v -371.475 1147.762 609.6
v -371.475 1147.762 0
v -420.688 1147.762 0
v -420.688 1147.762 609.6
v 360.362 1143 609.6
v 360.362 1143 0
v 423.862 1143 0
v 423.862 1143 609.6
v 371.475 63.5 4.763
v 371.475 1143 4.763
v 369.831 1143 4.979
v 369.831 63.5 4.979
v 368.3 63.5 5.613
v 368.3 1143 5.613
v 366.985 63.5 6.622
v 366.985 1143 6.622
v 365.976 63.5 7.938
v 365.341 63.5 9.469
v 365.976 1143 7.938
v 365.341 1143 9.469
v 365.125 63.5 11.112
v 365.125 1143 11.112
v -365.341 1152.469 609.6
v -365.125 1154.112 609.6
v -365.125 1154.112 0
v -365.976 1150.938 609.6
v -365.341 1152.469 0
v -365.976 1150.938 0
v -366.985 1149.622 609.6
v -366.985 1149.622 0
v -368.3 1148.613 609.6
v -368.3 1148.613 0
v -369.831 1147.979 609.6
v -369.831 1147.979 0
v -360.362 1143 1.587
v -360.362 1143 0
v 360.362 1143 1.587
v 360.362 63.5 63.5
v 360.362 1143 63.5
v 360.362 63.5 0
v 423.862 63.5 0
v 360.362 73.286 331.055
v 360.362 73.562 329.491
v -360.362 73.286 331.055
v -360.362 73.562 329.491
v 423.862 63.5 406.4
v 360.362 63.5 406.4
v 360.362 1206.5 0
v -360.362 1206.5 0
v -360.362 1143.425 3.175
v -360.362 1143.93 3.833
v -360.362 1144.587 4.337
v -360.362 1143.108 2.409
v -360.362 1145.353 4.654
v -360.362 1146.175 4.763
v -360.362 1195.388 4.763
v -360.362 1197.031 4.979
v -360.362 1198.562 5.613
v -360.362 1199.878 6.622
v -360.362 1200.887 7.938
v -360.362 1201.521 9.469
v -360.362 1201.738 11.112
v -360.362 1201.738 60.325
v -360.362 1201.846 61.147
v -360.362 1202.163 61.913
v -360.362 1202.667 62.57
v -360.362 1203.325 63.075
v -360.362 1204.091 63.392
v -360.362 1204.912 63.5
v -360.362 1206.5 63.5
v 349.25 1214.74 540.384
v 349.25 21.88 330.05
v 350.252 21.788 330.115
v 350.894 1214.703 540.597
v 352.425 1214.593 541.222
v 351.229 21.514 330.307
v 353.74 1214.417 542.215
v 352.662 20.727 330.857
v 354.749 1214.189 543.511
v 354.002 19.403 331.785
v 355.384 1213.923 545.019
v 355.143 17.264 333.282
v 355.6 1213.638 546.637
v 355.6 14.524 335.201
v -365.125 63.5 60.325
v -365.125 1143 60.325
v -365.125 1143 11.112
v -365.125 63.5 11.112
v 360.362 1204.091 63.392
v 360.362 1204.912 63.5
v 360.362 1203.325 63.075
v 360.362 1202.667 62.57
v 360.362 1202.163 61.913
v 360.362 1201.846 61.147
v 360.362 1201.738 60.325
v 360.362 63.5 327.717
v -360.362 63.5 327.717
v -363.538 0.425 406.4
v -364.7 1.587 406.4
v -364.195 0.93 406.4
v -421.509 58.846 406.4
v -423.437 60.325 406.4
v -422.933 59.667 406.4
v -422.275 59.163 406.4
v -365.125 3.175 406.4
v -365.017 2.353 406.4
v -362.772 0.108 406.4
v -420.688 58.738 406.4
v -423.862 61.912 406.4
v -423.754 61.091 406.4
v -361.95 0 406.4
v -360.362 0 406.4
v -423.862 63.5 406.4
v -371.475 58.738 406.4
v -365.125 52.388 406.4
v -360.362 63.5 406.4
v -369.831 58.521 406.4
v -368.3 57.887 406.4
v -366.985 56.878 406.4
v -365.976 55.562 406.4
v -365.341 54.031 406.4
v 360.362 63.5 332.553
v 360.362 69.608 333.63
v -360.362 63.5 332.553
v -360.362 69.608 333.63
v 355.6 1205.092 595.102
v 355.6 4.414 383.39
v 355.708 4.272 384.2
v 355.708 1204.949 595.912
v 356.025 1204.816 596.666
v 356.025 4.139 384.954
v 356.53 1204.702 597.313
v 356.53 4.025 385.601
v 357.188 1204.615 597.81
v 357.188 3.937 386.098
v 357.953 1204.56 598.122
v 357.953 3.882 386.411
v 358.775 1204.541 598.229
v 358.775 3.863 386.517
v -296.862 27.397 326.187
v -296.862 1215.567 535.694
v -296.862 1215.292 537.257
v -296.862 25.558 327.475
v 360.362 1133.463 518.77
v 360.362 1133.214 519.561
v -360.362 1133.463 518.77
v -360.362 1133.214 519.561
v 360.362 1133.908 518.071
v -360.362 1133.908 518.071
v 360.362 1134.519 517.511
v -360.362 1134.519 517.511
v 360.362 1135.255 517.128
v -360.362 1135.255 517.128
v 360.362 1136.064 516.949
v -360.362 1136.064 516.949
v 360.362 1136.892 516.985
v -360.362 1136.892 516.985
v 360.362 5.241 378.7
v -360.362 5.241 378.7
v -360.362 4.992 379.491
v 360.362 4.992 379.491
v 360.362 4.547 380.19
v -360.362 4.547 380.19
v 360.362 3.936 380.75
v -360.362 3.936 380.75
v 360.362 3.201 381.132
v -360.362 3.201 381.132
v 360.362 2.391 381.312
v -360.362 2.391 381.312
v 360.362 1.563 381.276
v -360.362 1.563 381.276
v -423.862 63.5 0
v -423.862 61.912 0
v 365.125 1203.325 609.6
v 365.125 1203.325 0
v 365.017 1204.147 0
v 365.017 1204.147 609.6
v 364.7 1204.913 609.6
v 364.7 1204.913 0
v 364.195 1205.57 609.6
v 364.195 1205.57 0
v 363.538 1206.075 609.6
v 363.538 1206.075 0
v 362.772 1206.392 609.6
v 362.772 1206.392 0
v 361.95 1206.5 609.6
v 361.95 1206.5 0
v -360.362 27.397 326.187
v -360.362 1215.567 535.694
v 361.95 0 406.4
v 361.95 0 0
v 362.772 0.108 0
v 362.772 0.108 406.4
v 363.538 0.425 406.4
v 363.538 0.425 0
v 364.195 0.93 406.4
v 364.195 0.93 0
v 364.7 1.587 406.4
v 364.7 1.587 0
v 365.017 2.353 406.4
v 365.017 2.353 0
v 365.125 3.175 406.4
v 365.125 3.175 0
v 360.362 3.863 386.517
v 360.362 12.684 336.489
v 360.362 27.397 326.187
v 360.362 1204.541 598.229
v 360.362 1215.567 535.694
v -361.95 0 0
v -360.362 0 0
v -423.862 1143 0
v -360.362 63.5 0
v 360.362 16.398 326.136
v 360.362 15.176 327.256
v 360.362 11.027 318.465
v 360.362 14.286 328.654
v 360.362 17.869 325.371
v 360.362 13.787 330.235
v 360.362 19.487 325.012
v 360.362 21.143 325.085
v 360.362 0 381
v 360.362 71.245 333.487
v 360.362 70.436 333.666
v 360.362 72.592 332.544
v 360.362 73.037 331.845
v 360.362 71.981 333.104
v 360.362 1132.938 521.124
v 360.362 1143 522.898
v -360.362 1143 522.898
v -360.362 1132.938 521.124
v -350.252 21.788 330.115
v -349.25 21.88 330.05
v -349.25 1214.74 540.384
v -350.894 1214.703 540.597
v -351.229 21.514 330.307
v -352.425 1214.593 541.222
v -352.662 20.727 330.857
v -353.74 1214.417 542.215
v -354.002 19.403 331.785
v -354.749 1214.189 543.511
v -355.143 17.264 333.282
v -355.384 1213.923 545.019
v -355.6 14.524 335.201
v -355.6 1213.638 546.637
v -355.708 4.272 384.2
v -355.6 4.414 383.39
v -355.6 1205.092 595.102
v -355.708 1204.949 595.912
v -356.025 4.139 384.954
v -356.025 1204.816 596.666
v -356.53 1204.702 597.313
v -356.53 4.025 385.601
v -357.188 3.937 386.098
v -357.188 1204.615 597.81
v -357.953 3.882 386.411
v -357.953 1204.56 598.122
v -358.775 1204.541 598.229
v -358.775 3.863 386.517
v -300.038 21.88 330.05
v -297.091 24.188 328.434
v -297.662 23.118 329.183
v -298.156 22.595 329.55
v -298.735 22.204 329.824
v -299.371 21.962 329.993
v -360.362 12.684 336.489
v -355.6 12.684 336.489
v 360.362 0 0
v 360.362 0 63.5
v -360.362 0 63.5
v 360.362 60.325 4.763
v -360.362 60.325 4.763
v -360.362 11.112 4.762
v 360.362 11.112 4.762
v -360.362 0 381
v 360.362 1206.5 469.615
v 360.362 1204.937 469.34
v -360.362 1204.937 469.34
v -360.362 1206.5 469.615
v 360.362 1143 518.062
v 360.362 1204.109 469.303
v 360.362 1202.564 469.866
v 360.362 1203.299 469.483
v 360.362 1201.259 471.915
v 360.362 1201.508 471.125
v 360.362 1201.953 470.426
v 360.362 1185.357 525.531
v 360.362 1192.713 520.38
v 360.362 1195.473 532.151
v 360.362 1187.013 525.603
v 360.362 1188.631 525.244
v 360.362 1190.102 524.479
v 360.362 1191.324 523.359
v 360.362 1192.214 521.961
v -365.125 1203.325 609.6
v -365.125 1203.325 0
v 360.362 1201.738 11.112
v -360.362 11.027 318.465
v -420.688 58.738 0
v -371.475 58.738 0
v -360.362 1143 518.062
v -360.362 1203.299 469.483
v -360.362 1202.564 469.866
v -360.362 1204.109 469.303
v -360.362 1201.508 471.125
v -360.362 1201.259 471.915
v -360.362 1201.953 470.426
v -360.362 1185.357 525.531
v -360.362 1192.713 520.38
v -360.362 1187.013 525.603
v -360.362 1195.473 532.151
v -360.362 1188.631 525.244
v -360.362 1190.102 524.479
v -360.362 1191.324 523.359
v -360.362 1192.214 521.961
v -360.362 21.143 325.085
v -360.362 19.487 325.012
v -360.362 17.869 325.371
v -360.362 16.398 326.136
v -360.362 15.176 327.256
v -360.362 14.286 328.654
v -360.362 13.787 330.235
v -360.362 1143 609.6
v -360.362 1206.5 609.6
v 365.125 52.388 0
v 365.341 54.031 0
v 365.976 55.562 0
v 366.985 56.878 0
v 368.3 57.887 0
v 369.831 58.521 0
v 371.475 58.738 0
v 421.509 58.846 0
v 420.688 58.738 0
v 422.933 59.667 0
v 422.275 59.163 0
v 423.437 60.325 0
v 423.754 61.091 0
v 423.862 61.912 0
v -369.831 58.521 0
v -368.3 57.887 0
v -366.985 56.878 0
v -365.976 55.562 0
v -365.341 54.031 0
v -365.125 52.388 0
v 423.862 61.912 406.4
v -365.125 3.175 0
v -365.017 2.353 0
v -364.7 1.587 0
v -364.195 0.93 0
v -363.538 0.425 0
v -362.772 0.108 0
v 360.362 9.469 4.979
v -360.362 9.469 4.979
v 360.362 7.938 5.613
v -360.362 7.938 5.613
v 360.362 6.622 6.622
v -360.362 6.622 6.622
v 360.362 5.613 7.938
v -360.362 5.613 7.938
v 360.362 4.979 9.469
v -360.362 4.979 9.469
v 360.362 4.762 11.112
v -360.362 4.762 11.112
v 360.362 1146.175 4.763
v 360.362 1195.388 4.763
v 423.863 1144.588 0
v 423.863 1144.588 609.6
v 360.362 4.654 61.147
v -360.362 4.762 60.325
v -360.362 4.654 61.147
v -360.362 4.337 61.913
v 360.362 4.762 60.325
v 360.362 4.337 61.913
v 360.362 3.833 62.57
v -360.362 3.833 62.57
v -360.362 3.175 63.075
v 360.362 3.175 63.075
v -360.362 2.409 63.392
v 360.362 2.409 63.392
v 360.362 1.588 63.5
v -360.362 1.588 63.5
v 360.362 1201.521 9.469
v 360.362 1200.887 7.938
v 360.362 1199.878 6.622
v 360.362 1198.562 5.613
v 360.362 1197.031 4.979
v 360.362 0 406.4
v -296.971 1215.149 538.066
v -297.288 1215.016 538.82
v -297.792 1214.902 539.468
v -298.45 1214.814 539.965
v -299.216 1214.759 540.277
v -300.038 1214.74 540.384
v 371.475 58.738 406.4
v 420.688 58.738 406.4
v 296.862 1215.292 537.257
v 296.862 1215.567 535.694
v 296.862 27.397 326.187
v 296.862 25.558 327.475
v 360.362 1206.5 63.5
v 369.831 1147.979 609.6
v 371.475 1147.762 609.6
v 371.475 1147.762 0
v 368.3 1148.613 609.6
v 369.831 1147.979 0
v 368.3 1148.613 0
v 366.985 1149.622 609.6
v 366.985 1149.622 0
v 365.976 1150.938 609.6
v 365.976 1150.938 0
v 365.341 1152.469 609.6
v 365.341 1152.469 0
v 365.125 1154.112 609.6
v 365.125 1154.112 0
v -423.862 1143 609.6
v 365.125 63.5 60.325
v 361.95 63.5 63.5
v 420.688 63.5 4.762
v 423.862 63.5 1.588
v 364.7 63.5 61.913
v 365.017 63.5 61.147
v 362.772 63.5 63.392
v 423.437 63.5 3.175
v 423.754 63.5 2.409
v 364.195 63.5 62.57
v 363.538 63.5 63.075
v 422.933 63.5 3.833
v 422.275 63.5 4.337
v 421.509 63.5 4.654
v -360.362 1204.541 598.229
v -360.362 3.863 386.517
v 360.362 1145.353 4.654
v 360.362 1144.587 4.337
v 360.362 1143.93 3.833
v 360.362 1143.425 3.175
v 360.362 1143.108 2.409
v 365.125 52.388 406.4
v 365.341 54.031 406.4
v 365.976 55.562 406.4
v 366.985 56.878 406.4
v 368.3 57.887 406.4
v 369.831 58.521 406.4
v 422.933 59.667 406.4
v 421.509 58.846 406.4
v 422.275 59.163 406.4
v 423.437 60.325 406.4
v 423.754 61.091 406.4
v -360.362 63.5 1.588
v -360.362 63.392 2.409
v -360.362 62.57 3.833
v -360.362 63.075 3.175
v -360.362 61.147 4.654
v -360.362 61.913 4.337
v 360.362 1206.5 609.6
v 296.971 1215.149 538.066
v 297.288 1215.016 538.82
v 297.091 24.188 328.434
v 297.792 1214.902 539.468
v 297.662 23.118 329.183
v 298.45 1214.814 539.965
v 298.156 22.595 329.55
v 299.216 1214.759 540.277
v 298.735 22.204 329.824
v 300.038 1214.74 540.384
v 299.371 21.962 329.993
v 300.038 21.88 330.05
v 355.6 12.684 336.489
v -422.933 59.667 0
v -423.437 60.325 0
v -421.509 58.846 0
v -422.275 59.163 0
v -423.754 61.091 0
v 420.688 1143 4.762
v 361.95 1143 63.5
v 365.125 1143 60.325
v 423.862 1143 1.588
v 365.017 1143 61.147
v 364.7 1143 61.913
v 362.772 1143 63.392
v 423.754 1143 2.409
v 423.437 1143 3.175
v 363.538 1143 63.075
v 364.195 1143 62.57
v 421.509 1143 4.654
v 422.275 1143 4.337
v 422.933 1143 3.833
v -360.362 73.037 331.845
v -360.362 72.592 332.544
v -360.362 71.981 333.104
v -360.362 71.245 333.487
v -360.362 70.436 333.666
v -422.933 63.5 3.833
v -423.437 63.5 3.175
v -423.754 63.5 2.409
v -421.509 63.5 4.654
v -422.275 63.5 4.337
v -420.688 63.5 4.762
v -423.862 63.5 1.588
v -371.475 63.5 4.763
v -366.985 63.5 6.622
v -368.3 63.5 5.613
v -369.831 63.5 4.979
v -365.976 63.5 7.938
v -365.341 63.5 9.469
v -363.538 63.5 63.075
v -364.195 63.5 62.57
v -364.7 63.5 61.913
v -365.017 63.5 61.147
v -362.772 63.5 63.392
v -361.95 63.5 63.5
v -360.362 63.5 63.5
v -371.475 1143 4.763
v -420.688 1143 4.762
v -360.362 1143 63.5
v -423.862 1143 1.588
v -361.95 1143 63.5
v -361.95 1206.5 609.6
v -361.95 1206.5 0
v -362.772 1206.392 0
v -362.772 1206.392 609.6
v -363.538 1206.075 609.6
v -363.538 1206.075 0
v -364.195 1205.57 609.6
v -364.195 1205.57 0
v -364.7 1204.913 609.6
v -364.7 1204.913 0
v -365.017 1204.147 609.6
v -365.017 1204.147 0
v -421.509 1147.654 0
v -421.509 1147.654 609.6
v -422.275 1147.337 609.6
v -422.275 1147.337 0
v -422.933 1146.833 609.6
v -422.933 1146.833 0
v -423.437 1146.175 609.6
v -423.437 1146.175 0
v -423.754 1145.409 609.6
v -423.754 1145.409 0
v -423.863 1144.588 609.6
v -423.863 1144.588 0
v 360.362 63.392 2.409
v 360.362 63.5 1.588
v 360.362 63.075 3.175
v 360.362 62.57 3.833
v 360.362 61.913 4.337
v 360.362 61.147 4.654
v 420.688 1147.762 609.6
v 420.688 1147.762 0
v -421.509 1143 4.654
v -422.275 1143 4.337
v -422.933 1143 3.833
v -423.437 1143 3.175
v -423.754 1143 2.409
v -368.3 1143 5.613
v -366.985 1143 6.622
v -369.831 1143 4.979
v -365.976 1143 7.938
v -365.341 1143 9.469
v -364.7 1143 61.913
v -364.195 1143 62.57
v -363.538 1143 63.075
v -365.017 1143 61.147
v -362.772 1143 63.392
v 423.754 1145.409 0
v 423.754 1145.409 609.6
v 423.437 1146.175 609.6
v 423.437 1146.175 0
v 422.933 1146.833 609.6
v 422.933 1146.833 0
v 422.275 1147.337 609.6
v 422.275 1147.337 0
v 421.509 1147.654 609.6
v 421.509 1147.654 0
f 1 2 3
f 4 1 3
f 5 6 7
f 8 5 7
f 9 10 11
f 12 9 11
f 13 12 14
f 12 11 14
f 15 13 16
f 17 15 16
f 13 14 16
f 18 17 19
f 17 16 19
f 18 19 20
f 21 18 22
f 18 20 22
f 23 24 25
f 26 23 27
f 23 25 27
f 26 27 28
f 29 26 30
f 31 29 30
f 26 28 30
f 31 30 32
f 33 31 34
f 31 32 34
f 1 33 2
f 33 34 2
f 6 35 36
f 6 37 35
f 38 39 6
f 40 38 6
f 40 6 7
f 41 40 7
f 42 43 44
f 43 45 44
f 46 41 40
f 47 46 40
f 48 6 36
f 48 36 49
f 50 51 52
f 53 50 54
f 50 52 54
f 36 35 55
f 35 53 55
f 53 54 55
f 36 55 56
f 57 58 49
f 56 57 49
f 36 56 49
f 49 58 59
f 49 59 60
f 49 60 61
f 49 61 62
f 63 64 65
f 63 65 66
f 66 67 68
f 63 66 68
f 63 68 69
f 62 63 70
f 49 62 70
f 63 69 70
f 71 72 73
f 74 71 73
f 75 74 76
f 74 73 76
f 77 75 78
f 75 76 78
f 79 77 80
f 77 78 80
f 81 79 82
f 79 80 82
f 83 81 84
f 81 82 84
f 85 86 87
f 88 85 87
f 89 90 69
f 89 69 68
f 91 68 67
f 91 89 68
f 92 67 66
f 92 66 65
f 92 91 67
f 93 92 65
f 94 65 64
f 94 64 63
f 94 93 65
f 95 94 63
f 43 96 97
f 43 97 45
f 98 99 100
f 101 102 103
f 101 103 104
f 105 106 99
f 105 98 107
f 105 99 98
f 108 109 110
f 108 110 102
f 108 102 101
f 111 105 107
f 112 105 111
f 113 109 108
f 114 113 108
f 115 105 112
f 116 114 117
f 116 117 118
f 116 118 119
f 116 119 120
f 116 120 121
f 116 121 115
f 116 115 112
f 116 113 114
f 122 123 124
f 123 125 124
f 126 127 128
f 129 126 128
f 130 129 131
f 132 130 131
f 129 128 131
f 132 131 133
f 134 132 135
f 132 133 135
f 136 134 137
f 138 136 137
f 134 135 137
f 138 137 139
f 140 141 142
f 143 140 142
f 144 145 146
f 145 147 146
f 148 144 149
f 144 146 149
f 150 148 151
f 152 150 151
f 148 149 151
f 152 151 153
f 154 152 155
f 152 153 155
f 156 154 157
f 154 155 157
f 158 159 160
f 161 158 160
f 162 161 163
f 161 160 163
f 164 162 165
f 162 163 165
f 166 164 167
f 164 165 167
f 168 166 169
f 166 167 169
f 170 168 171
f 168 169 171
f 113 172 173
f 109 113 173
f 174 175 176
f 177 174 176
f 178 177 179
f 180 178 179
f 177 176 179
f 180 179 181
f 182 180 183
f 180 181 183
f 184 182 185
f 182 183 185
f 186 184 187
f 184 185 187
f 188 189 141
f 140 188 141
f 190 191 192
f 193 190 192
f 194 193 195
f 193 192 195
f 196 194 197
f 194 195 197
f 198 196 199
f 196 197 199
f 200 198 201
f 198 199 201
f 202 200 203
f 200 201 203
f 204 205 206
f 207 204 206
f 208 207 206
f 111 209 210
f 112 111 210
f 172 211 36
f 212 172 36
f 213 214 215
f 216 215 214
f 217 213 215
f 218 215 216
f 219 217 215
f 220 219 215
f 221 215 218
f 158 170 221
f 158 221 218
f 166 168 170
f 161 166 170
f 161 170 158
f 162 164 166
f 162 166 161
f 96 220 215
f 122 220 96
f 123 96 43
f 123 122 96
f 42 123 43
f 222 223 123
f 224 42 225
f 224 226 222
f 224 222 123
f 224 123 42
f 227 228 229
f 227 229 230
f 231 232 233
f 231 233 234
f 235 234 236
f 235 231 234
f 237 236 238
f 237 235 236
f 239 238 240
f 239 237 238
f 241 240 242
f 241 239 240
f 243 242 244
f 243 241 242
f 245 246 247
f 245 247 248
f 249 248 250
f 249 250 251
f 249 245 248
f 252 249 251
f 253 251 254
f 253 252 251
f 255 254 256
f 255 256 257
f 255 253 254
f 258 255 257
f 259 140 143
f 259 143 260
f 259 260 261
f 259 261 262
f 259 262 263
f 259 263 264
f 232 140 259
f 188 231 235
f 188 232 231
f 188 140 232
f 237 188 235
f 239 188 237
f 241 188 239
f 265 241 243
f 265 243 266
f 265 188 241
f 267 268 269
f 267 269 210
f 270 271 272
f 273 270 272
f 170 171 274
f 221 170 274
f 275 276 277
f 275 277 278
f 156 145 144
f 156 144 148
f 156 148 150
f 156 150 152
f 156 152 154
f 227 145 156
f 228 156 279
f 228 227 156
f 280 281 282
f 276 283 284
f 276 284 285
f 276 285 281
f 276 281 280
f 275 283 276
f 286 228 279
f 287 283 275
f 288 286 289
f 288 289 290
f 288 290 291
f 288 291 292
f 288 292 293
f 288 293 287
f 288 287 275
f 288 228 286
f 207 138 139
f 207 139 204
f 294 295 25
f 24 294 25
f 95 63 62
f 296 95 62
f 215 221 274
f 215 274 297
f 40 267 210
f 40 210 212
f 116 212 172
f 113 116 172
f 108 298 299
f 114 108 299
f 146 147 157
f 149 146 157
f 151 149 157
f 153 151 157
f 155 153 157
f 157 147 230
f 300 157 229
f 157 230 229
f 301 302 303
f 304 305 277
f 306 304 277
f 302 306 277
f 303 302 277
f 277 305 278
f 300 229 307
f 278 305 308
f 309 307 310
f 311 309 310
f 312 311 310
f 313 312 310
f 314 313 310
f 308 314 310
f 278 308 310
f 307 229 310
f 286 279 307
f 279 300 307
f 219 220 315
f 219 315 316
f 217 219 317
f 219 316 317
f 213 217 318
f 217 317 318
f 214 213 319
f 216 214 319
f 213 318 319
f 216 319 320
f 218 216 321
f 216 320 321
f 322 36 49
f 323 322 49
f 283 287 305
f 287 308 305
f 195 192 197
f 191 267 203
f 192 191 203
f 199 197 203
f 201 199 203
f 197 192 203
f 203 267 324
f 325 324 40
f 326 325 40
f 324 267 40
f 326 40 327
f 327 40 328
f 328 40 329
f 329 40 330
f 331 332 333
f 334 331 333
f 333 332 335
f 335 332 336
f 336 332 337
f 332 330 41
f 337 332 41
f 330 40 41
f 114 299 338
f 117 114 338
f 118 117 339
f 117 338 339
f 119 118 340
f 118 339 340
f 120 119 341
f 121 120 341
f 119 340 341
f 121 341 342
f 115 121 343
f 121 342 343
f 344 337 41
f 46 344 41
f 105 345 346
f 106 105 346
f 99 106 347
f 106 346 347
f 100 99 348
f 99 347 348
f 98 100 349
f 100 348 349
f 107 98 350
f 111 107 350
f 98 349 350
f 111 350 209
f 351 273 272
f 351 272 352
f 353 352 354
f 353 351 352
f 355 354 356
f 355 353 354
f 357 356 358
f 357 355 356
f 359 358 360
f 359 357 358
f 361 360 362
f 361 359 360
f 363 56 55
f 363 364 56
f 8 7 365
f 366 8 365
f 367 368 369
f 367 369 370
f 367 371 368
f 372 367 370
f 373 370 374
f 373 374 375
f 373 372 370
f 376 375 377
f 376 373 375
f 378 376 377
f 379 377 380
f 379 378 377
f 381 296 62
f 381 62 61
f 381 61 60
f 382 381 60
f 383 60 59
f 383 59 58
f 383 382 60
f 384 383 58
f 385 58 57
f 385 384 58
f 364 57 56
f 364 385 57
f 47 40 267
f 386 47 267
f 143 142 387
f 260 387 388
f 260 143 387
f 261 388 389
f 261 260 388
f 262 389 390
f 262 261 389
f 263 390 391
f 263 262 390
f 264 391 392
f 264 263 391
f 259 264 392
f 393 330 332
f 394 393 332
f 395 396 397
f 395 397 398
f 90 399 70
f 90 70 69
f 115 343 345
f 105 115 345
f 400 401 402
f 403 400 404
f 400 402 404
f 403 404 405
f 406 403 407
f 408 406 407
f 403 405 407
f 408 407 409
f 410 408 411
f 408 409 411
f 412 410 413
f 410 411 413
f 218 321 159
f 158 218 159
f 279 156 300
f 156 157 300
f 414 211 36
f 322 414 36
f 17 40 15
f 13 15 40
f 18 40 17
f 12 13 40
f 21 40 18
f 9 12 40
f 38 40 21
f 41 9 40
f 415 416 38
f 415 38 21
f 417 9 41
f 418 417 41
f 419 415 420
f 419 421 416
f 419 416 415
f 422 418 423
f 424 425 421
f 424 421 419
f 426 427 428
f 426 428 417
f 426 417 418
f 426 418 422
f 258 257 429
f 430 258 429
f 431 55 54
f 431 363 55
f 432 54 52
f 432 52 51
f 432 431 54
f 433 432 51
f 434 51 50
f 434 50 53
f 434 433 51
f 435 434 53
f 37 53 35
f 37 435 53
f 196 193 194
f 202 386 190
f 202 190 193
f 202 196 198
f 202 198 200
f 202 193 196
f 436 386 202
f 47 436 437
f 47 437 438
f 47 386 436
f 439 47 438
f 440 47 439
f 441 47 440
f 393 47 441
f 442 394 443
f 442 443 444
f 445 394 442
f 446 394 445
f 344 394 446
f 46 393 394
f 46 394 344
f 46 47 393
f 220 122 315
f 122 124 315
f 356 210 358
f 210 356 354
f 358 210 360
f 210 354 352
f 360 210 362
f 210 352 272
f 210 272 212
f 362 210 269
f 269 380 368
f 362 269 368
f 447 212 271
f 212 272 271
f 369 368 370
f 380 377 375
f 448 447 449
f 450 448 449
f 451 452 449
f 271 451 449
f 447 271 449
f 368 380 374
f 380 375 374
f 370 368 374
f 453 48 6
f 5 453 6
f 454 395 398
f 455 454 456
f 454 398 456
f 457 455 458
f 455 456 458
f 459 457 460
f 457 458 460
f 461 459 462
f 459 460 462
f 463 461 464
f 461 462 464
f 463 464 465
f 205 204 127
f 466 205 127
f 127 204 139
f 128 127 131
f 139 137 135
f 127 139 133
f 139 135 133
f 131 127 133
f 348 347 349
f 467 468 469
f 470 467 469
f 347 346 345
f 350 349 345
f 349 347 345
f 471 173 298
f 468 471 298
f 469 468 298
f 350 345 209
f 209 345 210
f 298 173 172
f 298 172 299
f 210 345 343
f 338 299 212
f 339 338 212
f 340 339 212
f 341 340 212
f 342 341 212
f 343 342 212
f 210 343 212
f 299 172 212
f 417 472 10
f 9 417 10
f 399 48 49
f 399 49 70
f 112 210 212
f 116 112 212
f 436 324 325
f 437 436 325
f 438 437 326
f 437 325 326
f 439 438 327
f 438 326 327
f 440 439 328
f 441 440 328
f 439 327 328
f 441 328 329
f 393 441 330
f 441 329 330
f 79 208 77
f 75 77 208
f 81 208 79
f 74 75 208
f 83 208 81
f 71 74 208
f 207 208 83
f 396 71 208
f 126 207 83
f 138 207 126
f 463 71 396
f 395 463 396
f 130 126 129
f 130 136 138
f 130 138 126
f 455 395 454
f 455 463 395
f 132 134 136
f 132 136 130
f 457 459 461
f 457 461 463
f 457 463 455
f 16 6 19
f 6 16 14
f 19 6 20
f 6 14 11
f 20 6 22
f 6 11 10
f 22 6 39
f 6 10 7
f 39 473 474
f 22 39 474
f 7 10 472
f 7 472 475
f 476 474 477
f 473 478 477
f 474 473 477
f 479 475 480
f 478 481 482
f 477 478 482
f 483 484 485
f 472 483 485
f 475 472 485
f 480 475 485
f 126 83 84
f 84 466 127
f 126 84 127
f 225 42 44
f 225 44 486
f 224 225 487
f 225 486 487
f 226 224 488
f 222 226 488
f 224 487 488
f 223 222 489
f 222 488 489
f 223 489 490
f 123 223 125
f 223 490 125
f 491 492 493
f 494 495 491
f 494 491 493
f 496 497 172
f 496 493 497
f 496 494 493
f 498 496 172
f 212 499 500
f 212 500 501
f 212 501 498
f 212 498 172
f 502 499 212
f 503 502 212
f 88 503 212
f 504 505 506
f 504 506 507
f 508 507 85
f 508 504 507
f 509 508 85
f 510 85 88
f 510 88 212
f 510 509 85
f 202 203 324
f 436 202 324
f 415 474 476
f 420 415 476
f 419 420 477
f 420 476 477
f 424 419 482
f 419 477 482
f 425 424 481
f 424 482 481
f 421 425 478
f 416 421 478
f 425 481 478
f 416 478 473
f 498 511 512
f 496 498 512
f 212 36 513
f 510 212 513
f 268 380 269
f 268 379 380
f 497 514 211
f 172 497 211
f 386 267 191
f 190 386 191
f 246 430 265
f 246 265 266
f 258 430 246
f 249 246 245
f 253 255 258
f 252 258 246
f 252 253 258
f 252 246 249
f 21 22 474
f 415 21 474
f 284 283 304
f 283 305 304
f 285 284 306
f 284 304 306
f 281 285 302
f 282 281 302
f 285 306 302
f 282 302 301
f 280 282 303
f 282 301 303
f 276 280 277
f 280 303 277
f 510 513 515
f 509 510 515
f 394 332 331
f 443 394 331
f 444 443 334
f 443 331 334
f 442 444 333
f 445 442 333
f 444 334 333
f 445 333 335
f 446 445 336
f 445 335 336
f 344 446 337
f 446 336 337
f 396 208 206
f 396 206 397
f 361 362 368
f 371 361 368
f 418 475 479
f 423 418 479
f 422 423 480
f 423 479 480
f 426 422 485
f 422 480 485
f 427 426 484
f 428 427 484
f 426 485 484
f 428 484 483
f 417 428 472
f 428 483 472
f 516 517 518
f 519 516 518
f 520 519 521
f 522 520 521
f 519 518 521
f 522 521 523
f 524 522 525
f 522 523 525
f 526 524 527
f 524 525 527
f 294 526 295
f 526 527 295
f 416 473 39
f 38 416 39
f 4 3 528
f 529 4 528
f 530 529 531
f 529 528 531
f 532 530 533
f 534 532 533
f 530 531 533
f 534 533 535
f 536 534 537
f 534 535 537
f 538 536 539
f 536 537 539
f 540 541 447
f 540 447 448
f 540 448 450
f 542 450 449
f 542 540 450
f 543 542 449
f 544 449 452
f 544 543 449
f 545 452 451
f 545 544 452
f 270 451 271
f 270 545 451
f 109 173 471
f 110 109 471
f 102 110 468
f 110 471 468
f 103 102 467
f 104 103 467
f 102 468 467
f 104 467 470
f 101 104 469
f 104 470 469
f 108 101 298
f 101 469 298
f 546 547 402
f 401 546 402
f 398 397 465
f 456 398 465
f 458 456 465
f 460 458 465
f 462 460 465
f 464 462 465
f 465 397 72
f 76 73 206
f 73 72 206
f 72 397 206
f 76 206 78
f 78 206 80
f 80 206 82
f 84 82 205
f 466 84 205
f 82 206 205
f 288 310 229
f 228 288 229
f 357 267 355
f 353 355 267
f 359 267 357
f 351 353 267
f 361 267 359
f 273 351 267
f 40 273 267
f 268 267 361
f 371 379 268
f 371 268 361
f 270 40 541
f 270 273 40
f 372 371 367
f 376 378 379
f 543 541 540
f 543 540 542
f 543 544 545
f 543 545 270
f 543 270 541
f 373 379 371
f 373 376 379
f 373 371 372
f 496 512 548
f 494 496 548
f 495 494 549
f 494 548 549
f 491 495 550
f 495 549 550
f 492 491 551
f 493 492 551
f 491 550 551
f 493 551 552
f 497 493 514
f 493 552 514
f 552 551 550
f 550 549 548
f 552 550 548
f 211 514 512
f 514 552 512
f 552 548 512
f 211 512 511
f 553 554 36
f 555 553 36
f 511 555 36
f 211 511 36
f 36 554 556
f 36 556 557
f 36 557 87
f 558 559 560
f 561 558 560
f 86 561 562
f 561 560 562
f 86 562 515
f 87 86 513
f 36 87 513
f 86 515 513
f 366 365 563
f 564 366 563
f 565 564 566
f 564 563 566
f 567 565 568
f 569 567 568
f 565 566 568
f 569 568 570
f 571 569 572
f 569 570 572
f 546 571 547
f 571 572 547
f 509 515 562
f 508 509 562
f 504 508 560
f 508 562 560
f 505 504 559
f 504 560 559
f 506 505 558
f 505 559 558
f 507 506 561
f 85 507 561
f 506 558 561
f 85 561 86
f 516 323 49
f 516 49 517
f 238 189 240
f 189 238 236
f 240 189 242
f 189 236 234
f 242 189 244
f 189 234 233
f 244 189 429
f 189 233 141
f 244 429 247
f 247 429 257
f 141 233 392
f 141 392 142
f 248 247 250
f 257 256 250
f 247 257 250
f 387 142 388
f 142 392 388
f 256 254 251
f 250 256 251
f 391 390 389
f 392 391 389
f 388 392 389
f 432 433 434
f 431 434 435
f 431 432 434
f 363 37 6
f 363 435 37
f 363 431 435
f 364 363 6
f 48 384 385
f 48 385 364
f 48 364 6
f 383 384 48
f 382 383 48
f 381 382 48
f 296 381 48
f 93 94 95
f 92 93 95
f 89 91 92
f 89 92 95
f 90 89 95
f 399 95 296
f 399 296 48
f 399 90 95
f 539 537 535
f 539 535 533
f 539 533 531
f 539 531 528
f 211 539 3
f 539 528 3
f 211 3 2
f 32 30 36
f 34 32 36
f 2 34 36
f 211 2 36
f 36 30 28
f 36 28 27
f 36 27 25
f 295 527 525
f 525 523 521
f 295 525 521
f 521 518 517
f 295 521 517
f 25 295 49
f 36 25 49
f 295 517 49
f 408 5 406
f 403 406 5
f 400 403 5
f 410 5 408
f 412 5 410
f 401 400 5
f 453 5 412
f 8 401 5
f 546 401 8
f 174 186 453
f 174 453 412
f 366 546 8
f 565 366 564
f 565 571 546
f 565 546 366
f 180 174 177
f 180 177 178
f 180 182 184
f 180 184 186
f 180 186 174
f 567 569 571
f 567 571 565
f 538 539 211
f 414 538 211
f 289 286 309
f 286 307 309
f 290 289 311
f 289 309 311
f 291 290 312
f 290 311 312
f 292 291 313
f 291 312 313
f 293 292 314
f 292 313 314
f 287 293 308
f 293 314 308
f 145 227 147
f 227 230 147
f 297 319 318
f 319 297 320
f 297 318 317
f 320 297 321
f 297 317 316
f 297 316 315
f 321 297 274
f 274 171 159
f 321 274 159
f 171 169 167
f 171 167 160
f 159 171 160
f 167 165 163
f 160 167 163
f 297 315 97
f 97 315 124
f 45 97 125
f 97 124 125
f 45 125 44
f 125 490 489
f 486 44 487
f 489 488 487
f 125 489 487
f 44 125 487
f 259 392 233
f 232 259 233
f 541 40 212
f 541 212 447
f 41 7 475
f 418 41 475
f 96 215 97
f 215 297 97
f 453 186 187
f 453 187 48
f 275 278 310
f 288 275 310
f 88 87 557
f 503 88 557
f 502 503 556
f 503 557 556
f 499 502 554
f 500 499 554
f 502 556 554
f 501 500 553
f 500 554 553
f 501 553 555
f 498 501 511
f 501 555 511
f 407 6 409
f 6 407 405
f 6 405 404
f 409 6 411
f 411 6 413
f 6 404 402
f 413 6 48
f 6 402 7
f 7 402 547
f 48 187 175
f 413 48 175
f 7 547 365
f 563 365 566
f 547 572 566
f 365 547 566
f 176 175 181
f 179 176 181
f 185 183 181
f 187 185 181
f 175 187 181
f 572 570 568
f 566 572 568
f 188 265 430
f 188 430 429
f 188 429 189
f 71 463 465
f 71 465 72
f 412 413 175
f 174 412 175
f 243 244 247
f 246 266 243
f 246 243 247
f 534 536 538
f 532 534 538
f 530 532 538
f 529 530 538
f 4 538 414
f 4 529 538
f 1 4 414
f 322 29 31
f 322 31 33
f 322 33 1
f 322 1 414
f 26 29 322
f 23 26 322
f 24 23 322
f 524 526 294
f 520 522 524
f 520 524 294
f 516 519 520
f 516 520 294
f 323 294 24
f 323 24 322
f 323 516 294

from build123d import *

# Parameters (mm, degrees)
F2_DEPTH       = 406.4
F3_DEPTH       = 609.6
F4_DEPTH       = 360.3625
F4_DEPTH_BACK  = 360.3625
F6_DEPTH       = 1219.2
F8_DEPTH       = 784.226
F11_DEPTH      = 360.3625
F11_DEPTH_BACK = 360.3625
F13_DEPTH      = 1079.5


with BuildPart() as f2:
    # F1 (on Top) → F2 (new body)
    with BuildSketch(Plane.XY):
        with BuildLine():
            ThreePointArc((-365.125, 3.175), (-364.1950640303, 0.9299359697), (-361.95, 0))
            Line((-361.95, 0), (-360.3625, 0))
            Line((-360.3625, 0), (-360.3625, 63.5))
            Line((-360.3625, 63.5), (-423.8625, 63.5))
            Line((-423.8625, 63.5), (-423.8625, 61.9125))
            ThreePointArc((-423.8625, 61.9125), (-422.9325640303, 59.6674359697), (-420.6875, 58.7375))
            Line((-420.6875, 58.7375), (-371.475, 58.7375))
            ThreePointArc((-371.475, 58.7375), (-366.9848719395, 56.8776280605), (-365.125, 52.3875))
            Line((-365.125, 52.3875), (-365.125, 3.175))
        make_face()
    extrude(amount=F2_DEPTH)


with BuildPart() as f2b:
    # F1 (on Top) → F2, piece 2 (new body)
    with BuildSketch(Plane.XY):
        with BuildLine():
            Line((360.3625, 63.5), (360.3625, 0))
            Line((360.3625, 0), (361.95, 0))
            ThreePointArc((361.95, 0), (364.1950640303, 0.9299359697), (365.125, 3.175))
            Line((365.125, 3.175), (365.125, 52.3875))
            ThreePointArc((365.125, 52.3875), (366.9848719395, 56.8776280605), (371.475, 58.7375))
            Line((371.475, 58.7375), (420.6875, 58.7375))
            ThreePointArc((420.6875, 58.7375), (422.9325640303, 59.6674359697), (423.8625, 61.9125))
            Line((423.8625, 61.9125), (423.8625, 63.5))
            Line((423.8625, 63.5), (360.3625, 63.5))
        make_face()
    extrude(amount=F2_DEPTH)


with BuildPart() as f3:
    # F1 (on Top) → F3 (new body)
    with BuildSketch(Plane.XY):
        with BuildLine():
            Line((-360.3625, 1206.5), (-361.95, 1206.5))
            ThreePointArc((-361.95, 1206.5), (-364.1950640303, 1205.5700640303), (-365.125, 1203.325))
            Line((-365.125, 1203.325), (-365.125, 1154.1125))
            ThreePointArc((-365.125, 1154.1125), (-366.9848719395, 1149.6223719395), (-371.475, 1147.7625))
            Line((-371.475, 1147.7625), (-420.6875, 1147.7625))
            ThreePointArc((-420.6875, 1147.7625), (-422.9325640303, 1146.8325640303), (-423.8625, 1144.5875))
            Line((-423.8625, 1144.5875), (-423.8625, 1143))
            Line((-423.8625, 1143), (-360.3625, 1143))
            Line((-360.3625, 1143), (-360.3625, 1206.5))
        make_face()
    extrude(amount=F3_DEPTH)


with BuildPart() as f3b:
    # F1 (on Top) → F3, piece 2 (new body)
    with BuildSketch(Plane.XY):
        with BuildLine():
            ThreePointArc((365.125, 1203.325), (364.1950640303, 1205.5700640303), (361.95, 1206.5))
            Line((361.95, 1206.5), (360.3625, 1206.5))
            Line((360.3625, 1206.5), (360.3625, 1143))
            Line((360.3625, 1143), (423.8625, 1143))
            Line((423.8625, 1143), (423.8625, 1144.5875))
            ThreePointArc((423.8625, 1144.5875), (422.9325640303, 1146.8325640303), (420.6875, 1147.7625))
            Line((420.6875, 1147.7625), (371.475, 1147.7625))
            ThreePointArc((371.475, 1147.7625), (366.9848719395, 1149.6223719395), (365.125, 1154.1125))
            Line((365.125, 1154.1125), (365.125, 1203.325))
        make_face()
    extrude(amount=F3_DEPTH)


with BuildPart() as f4:
    # F0 (on Right) → F4 (new body, two sides)
    with BuildSketch(Plane.YZ) as f4_sk:
        with BuildLine():
            Line((1.5633823079, 381.275666482), (0, 381))
            Line((0, 381), (11.0266592819, 318.4647076837))
            Line((11.0266592818, 318.4647076837), (63.5, 327.7171734202))
            Line((63.5, 327.7171734202), (63.5, 332.5531426593))
            Line((63.5, 332.5531426593), (21.1433359911, 325.0845199818))
            ThreePointArc((21.1433359911, 325.0845199818), (16.398459692, 326.1364337322), (13.7871408312, 330.2353832852))
            Line((13.7871408312, 330.2353832852), (5.2414798878, 378.7002348303))
            ThreePointArc((5.2414798878, 378.7002348303), (3.9358204574, 380.7497096069), (1.5633823079, 381.275666482))
        make_face()
        with BuildLine():
            Line((63.5, 332.5531426593), (63.5, 327.7171734202))
            Line((63.5, 327.7171734202), (73.5619515981, 329.4913669656))
            Line((73.5619515981, 329.4913669656), (73.2862851161, 331.0547492735))
            ThreePointArc((73.2862851161, 331.0547492735), (71.9806256857, 333.10422405), (69.6081875362, 333.6301809252))
            Line((69.6081875362, 333.6301809252), (63.5, 332.5531426593))
        make_face()
    extrude(amount=-F4_DEPTH)
    extrude(f4_sk.sketch, amount=F4_DEPTH_BACK)


with BuildPart() as f4b:
    # F0 (on Right) → F4, piece 2 (new body, two sides)
    with BuildSketch(Plane.YZ) as f4_2_sk:
        with BuildLine():
            Line((1195.4733407181, 532.1505840707), (1143, 522.8981183341))
            Line((1143, 522.8981183341), (1143, 518.062149095))
            Line((1143, 518.062149095), (1185.3566640089, 525.5307717726))
            ThreePointArc((1185.3566640089, 525.5307717726), (1190.101540308, 524.4788580222), (1192.7128591688, 520.3799084692))
            Line((1192.7128591688, 520.3799084692), (1201.2585201122, 471.9150569241))
            ThreePointArc((1201.2585201122, 471.9150569241), (1202.5641795426, 469.8655821475), (1204.9366176921, 469.3396252723))
            Line((1204.9366176921, 469.3396252723), (1206.5, 469.6152917544))
            Line((1206.5, 469.6152917544), (1195.4733407181, 532.1505840707))
        make_face()
        with BuildLine():
            Line((1143, 522.8981183341), (1132.9380484019, 521.1239247888))
            Line((1132.9380484019, 521.1239247888), (1133.2137148839, 519.5605424809))
            ThreePointArc((1133.2137148839, 519.5605424809), (1134.5193743143, 517.5110677044), (1136.8918124638, 516.9851108292))
            Line((1136.8918124638, 516.9851108292), (1143, 518.062149095))
            Line((1143, 518.062149095), (1143, 522.8981183341))
        make_face()
    extrude(amount=-F4_DEPTH)
    extrude(f4_2_sk.sketch, amount=F4_DEPTH_BACK)


with BuildPart() as f6:
    # F5 (on face) → F6 (new body)
    with BuildSketch(Plane(origin=(0, 69.8449842273, 12.3155551864), x_dir=(-1, 0, 0), z_dir=(0, 0.984807753, 0.1736481777))):
        with BuildLine():
            Line((-358.775, 379.9742538977), (-360.3625, 379.9742538977))
            Line((-360.3625, 379.9742538977), (-360.3625, 316.4742538977))
            Line((-360.3625, 316.4742538977), (-296.8625, 316.4742538977))
            Line((-296.8625, 316.4742538977), (-296.8625, 318.0617538977))
            ThreePointArc((-296.8625, 318.0617538977), (-297.7924359697, 320.3068179279), (-300.0375, 321.2367538977))
            Line((-300.0375, 321.2367538977), (-349.25, 321.2367538977))
            ThreePointArc((-349.25, 321.2367538977), (-353.7401280605, 323.0966258371), (-355.6, 327.5867538977))
            Line((-355.6, 327.5867538977), (-355.6, 376.7992538977))
            ThreePointArc((-355.6, 376.7992538977), (-356.5299359697, 379.0443179279), (-358.775, 379.9742538977))
        make_face()
    extrude(amount=F6_DEPTH)

    # F7 (on face) → F8 (cut, through all)
    with BuildSketch(Plane.YZ.offset(360.3625)):
        Polygon((12.6844749031, 336.4889125168), (14.8898067594, 323.9818540536), (27.3968652227, 326.18718591), align=None)
    extrude(amount=-F8_DEPTH, mode=Mode.SUBTRACT)


with BuildPart() as f9_1:
    # F9: instance of F6
    add(f6.part.mirror(Plane.YZ))


with BuildPart() as f11:
    # F10 (on Right) → F11 (new body, two sides)
    with BuildSketch(Plane.YZ) as f11_sk:
        with BuildLine():
            Line((1.5875, 63.5), (0, 63.5))
            Line((0, 63.5), (0, 0))
            Line((0, 0), (63.5, 0))
            Line((63.5, 0), (63.5, 1.5875))
            ThreePointArc((63.5, 1.5875), (62.5700640303, 3.8325640303), (60.325, 4.7625))
            Line((60.325, 4.7625), (11.1125, 4.7625))
            ThreePointArc((11.1125, 4.7625), (6.6223719395, 6.6223719395), (4.7625, 11.1125))
            Line((4.7625, 11.1125), (4.7625, 60.325))
            ThreePointArc((4.7625, 60.325), (3.8325640303, 62.5700640303), (1.5875, 63.5))
        make_face()
    extrude(amount=F11_DEPTH)
    extrude(f11_sk.sketch, amount=-F11_DEPTH_BACK)


with BuildPart() as f11b:
    # F10 (on Right) → F11, piece 2 (new body, two sides)
    with BuildSketch(Plane.YZ) as f11_2_sk:
        with BuildLine():
            Line((1143, 1.5875), (1143, 0))
            Line((1143, 0), (1206.5, 0))
            Line((1206.5, 0), (1206.5, 63.5))
            Line((1206.5, 63.5), (1204.9125, 63.5))
            ThreePointArc((1204.9125, 63.5), (1202.6674359697, 62.5700640303), (1201.7375, 60.325))
            Line((1201.7375, 60.325), (1201.7375, 11.1125))
            ThreePointArc((1201.7375, 11.1125), (1199.8776280605, 6.6223719395), (1195.3875, 4.7625))
            Line((1195.3875, 4.7625), (1146.175, 4.7625))
            ThreePointArc((1146.175, 4.7625), (1143.9299359697, 3.8325640303), (1143, 1.5875))
        make_face()
    extrude(amount=F11_DEPTH)
    extrude(f11_2_sk.sketch, amount=-F11_DEPTH_BACK)


with BuildPart() as f13:
    # F12 (on face) → F13 (new body, through all)
    with BuildSketch(Plane.XZ.offset(-1143)):
        with BuildLine():
            Line((361.95, 63.5), (360.3625, 63.5))
            Line((360.3625, 63.5), (360.3625, 0))
            Line((360.3625, 0), (423.8625, 0))
            Line((423.8625, 0), (423.8625, 1.5875))
            ThreePointArc((423.8625, 1.5875), (422.9325640303, 3.8325640303), (420.6875, 4.7625))
            Line((420.6875, 4.7625), (371.475, 4.7625))
            ThreePointArc((371.475, 4.7625), (366.9848719395, 6.6223719395), (365.125, 11.1125))
            Line((365.125, 11.1125), (365.125, 60.325))
            ThreePointArc((365.125, 60.325), (364.1950640303, 62.5700640303), (361.95, 63.5))
        make_face()
    extrude(amount=F13_DEPTH)


with BuildPart() as f13b:
    # F12 (on face) → F13, piece 2 (new body, through all)
    with BuildSketch(Plane.XZ.offset(-1143)):
        with BuildLine():
            Line((-423.8625, 1.5875), (-423.8625, 0))
            Line((-423.8625, 0), (-360.3625, 0))
            Line((-360.3625, 0), (-360.3625, 63.5))
            Line((-360.3625, 63.5), (-361.95, 63.5))
            ThreePointArc((-361.95, 63.5), (-364.1950640303, 62.5700640303), (-365.125, 60.325))
            Line((-365.125, 60.325), (-365.125, 11.1125))
            ThreePointArc((-365.125, 11.1125), (-366.9848719395, 6.6223719395), (-371.475, 4.7625))
            Line((-371.475, 4.7625), (-420.6875, 4.7625))
            ThreePointArc((-420.6875, 4.7625), (-422.9325640303, 3.8325640303), (-423.8625, 1.5875))
        make_face()
    extrude(amount=F13_DEPTH)


solid = Compound([f2.part, f2b.part, f3.part, f3b.part, f4.part, f4b.part, f6.part, f9_1.part, f11.part, f11b.part, f13.part, f13b.part])
